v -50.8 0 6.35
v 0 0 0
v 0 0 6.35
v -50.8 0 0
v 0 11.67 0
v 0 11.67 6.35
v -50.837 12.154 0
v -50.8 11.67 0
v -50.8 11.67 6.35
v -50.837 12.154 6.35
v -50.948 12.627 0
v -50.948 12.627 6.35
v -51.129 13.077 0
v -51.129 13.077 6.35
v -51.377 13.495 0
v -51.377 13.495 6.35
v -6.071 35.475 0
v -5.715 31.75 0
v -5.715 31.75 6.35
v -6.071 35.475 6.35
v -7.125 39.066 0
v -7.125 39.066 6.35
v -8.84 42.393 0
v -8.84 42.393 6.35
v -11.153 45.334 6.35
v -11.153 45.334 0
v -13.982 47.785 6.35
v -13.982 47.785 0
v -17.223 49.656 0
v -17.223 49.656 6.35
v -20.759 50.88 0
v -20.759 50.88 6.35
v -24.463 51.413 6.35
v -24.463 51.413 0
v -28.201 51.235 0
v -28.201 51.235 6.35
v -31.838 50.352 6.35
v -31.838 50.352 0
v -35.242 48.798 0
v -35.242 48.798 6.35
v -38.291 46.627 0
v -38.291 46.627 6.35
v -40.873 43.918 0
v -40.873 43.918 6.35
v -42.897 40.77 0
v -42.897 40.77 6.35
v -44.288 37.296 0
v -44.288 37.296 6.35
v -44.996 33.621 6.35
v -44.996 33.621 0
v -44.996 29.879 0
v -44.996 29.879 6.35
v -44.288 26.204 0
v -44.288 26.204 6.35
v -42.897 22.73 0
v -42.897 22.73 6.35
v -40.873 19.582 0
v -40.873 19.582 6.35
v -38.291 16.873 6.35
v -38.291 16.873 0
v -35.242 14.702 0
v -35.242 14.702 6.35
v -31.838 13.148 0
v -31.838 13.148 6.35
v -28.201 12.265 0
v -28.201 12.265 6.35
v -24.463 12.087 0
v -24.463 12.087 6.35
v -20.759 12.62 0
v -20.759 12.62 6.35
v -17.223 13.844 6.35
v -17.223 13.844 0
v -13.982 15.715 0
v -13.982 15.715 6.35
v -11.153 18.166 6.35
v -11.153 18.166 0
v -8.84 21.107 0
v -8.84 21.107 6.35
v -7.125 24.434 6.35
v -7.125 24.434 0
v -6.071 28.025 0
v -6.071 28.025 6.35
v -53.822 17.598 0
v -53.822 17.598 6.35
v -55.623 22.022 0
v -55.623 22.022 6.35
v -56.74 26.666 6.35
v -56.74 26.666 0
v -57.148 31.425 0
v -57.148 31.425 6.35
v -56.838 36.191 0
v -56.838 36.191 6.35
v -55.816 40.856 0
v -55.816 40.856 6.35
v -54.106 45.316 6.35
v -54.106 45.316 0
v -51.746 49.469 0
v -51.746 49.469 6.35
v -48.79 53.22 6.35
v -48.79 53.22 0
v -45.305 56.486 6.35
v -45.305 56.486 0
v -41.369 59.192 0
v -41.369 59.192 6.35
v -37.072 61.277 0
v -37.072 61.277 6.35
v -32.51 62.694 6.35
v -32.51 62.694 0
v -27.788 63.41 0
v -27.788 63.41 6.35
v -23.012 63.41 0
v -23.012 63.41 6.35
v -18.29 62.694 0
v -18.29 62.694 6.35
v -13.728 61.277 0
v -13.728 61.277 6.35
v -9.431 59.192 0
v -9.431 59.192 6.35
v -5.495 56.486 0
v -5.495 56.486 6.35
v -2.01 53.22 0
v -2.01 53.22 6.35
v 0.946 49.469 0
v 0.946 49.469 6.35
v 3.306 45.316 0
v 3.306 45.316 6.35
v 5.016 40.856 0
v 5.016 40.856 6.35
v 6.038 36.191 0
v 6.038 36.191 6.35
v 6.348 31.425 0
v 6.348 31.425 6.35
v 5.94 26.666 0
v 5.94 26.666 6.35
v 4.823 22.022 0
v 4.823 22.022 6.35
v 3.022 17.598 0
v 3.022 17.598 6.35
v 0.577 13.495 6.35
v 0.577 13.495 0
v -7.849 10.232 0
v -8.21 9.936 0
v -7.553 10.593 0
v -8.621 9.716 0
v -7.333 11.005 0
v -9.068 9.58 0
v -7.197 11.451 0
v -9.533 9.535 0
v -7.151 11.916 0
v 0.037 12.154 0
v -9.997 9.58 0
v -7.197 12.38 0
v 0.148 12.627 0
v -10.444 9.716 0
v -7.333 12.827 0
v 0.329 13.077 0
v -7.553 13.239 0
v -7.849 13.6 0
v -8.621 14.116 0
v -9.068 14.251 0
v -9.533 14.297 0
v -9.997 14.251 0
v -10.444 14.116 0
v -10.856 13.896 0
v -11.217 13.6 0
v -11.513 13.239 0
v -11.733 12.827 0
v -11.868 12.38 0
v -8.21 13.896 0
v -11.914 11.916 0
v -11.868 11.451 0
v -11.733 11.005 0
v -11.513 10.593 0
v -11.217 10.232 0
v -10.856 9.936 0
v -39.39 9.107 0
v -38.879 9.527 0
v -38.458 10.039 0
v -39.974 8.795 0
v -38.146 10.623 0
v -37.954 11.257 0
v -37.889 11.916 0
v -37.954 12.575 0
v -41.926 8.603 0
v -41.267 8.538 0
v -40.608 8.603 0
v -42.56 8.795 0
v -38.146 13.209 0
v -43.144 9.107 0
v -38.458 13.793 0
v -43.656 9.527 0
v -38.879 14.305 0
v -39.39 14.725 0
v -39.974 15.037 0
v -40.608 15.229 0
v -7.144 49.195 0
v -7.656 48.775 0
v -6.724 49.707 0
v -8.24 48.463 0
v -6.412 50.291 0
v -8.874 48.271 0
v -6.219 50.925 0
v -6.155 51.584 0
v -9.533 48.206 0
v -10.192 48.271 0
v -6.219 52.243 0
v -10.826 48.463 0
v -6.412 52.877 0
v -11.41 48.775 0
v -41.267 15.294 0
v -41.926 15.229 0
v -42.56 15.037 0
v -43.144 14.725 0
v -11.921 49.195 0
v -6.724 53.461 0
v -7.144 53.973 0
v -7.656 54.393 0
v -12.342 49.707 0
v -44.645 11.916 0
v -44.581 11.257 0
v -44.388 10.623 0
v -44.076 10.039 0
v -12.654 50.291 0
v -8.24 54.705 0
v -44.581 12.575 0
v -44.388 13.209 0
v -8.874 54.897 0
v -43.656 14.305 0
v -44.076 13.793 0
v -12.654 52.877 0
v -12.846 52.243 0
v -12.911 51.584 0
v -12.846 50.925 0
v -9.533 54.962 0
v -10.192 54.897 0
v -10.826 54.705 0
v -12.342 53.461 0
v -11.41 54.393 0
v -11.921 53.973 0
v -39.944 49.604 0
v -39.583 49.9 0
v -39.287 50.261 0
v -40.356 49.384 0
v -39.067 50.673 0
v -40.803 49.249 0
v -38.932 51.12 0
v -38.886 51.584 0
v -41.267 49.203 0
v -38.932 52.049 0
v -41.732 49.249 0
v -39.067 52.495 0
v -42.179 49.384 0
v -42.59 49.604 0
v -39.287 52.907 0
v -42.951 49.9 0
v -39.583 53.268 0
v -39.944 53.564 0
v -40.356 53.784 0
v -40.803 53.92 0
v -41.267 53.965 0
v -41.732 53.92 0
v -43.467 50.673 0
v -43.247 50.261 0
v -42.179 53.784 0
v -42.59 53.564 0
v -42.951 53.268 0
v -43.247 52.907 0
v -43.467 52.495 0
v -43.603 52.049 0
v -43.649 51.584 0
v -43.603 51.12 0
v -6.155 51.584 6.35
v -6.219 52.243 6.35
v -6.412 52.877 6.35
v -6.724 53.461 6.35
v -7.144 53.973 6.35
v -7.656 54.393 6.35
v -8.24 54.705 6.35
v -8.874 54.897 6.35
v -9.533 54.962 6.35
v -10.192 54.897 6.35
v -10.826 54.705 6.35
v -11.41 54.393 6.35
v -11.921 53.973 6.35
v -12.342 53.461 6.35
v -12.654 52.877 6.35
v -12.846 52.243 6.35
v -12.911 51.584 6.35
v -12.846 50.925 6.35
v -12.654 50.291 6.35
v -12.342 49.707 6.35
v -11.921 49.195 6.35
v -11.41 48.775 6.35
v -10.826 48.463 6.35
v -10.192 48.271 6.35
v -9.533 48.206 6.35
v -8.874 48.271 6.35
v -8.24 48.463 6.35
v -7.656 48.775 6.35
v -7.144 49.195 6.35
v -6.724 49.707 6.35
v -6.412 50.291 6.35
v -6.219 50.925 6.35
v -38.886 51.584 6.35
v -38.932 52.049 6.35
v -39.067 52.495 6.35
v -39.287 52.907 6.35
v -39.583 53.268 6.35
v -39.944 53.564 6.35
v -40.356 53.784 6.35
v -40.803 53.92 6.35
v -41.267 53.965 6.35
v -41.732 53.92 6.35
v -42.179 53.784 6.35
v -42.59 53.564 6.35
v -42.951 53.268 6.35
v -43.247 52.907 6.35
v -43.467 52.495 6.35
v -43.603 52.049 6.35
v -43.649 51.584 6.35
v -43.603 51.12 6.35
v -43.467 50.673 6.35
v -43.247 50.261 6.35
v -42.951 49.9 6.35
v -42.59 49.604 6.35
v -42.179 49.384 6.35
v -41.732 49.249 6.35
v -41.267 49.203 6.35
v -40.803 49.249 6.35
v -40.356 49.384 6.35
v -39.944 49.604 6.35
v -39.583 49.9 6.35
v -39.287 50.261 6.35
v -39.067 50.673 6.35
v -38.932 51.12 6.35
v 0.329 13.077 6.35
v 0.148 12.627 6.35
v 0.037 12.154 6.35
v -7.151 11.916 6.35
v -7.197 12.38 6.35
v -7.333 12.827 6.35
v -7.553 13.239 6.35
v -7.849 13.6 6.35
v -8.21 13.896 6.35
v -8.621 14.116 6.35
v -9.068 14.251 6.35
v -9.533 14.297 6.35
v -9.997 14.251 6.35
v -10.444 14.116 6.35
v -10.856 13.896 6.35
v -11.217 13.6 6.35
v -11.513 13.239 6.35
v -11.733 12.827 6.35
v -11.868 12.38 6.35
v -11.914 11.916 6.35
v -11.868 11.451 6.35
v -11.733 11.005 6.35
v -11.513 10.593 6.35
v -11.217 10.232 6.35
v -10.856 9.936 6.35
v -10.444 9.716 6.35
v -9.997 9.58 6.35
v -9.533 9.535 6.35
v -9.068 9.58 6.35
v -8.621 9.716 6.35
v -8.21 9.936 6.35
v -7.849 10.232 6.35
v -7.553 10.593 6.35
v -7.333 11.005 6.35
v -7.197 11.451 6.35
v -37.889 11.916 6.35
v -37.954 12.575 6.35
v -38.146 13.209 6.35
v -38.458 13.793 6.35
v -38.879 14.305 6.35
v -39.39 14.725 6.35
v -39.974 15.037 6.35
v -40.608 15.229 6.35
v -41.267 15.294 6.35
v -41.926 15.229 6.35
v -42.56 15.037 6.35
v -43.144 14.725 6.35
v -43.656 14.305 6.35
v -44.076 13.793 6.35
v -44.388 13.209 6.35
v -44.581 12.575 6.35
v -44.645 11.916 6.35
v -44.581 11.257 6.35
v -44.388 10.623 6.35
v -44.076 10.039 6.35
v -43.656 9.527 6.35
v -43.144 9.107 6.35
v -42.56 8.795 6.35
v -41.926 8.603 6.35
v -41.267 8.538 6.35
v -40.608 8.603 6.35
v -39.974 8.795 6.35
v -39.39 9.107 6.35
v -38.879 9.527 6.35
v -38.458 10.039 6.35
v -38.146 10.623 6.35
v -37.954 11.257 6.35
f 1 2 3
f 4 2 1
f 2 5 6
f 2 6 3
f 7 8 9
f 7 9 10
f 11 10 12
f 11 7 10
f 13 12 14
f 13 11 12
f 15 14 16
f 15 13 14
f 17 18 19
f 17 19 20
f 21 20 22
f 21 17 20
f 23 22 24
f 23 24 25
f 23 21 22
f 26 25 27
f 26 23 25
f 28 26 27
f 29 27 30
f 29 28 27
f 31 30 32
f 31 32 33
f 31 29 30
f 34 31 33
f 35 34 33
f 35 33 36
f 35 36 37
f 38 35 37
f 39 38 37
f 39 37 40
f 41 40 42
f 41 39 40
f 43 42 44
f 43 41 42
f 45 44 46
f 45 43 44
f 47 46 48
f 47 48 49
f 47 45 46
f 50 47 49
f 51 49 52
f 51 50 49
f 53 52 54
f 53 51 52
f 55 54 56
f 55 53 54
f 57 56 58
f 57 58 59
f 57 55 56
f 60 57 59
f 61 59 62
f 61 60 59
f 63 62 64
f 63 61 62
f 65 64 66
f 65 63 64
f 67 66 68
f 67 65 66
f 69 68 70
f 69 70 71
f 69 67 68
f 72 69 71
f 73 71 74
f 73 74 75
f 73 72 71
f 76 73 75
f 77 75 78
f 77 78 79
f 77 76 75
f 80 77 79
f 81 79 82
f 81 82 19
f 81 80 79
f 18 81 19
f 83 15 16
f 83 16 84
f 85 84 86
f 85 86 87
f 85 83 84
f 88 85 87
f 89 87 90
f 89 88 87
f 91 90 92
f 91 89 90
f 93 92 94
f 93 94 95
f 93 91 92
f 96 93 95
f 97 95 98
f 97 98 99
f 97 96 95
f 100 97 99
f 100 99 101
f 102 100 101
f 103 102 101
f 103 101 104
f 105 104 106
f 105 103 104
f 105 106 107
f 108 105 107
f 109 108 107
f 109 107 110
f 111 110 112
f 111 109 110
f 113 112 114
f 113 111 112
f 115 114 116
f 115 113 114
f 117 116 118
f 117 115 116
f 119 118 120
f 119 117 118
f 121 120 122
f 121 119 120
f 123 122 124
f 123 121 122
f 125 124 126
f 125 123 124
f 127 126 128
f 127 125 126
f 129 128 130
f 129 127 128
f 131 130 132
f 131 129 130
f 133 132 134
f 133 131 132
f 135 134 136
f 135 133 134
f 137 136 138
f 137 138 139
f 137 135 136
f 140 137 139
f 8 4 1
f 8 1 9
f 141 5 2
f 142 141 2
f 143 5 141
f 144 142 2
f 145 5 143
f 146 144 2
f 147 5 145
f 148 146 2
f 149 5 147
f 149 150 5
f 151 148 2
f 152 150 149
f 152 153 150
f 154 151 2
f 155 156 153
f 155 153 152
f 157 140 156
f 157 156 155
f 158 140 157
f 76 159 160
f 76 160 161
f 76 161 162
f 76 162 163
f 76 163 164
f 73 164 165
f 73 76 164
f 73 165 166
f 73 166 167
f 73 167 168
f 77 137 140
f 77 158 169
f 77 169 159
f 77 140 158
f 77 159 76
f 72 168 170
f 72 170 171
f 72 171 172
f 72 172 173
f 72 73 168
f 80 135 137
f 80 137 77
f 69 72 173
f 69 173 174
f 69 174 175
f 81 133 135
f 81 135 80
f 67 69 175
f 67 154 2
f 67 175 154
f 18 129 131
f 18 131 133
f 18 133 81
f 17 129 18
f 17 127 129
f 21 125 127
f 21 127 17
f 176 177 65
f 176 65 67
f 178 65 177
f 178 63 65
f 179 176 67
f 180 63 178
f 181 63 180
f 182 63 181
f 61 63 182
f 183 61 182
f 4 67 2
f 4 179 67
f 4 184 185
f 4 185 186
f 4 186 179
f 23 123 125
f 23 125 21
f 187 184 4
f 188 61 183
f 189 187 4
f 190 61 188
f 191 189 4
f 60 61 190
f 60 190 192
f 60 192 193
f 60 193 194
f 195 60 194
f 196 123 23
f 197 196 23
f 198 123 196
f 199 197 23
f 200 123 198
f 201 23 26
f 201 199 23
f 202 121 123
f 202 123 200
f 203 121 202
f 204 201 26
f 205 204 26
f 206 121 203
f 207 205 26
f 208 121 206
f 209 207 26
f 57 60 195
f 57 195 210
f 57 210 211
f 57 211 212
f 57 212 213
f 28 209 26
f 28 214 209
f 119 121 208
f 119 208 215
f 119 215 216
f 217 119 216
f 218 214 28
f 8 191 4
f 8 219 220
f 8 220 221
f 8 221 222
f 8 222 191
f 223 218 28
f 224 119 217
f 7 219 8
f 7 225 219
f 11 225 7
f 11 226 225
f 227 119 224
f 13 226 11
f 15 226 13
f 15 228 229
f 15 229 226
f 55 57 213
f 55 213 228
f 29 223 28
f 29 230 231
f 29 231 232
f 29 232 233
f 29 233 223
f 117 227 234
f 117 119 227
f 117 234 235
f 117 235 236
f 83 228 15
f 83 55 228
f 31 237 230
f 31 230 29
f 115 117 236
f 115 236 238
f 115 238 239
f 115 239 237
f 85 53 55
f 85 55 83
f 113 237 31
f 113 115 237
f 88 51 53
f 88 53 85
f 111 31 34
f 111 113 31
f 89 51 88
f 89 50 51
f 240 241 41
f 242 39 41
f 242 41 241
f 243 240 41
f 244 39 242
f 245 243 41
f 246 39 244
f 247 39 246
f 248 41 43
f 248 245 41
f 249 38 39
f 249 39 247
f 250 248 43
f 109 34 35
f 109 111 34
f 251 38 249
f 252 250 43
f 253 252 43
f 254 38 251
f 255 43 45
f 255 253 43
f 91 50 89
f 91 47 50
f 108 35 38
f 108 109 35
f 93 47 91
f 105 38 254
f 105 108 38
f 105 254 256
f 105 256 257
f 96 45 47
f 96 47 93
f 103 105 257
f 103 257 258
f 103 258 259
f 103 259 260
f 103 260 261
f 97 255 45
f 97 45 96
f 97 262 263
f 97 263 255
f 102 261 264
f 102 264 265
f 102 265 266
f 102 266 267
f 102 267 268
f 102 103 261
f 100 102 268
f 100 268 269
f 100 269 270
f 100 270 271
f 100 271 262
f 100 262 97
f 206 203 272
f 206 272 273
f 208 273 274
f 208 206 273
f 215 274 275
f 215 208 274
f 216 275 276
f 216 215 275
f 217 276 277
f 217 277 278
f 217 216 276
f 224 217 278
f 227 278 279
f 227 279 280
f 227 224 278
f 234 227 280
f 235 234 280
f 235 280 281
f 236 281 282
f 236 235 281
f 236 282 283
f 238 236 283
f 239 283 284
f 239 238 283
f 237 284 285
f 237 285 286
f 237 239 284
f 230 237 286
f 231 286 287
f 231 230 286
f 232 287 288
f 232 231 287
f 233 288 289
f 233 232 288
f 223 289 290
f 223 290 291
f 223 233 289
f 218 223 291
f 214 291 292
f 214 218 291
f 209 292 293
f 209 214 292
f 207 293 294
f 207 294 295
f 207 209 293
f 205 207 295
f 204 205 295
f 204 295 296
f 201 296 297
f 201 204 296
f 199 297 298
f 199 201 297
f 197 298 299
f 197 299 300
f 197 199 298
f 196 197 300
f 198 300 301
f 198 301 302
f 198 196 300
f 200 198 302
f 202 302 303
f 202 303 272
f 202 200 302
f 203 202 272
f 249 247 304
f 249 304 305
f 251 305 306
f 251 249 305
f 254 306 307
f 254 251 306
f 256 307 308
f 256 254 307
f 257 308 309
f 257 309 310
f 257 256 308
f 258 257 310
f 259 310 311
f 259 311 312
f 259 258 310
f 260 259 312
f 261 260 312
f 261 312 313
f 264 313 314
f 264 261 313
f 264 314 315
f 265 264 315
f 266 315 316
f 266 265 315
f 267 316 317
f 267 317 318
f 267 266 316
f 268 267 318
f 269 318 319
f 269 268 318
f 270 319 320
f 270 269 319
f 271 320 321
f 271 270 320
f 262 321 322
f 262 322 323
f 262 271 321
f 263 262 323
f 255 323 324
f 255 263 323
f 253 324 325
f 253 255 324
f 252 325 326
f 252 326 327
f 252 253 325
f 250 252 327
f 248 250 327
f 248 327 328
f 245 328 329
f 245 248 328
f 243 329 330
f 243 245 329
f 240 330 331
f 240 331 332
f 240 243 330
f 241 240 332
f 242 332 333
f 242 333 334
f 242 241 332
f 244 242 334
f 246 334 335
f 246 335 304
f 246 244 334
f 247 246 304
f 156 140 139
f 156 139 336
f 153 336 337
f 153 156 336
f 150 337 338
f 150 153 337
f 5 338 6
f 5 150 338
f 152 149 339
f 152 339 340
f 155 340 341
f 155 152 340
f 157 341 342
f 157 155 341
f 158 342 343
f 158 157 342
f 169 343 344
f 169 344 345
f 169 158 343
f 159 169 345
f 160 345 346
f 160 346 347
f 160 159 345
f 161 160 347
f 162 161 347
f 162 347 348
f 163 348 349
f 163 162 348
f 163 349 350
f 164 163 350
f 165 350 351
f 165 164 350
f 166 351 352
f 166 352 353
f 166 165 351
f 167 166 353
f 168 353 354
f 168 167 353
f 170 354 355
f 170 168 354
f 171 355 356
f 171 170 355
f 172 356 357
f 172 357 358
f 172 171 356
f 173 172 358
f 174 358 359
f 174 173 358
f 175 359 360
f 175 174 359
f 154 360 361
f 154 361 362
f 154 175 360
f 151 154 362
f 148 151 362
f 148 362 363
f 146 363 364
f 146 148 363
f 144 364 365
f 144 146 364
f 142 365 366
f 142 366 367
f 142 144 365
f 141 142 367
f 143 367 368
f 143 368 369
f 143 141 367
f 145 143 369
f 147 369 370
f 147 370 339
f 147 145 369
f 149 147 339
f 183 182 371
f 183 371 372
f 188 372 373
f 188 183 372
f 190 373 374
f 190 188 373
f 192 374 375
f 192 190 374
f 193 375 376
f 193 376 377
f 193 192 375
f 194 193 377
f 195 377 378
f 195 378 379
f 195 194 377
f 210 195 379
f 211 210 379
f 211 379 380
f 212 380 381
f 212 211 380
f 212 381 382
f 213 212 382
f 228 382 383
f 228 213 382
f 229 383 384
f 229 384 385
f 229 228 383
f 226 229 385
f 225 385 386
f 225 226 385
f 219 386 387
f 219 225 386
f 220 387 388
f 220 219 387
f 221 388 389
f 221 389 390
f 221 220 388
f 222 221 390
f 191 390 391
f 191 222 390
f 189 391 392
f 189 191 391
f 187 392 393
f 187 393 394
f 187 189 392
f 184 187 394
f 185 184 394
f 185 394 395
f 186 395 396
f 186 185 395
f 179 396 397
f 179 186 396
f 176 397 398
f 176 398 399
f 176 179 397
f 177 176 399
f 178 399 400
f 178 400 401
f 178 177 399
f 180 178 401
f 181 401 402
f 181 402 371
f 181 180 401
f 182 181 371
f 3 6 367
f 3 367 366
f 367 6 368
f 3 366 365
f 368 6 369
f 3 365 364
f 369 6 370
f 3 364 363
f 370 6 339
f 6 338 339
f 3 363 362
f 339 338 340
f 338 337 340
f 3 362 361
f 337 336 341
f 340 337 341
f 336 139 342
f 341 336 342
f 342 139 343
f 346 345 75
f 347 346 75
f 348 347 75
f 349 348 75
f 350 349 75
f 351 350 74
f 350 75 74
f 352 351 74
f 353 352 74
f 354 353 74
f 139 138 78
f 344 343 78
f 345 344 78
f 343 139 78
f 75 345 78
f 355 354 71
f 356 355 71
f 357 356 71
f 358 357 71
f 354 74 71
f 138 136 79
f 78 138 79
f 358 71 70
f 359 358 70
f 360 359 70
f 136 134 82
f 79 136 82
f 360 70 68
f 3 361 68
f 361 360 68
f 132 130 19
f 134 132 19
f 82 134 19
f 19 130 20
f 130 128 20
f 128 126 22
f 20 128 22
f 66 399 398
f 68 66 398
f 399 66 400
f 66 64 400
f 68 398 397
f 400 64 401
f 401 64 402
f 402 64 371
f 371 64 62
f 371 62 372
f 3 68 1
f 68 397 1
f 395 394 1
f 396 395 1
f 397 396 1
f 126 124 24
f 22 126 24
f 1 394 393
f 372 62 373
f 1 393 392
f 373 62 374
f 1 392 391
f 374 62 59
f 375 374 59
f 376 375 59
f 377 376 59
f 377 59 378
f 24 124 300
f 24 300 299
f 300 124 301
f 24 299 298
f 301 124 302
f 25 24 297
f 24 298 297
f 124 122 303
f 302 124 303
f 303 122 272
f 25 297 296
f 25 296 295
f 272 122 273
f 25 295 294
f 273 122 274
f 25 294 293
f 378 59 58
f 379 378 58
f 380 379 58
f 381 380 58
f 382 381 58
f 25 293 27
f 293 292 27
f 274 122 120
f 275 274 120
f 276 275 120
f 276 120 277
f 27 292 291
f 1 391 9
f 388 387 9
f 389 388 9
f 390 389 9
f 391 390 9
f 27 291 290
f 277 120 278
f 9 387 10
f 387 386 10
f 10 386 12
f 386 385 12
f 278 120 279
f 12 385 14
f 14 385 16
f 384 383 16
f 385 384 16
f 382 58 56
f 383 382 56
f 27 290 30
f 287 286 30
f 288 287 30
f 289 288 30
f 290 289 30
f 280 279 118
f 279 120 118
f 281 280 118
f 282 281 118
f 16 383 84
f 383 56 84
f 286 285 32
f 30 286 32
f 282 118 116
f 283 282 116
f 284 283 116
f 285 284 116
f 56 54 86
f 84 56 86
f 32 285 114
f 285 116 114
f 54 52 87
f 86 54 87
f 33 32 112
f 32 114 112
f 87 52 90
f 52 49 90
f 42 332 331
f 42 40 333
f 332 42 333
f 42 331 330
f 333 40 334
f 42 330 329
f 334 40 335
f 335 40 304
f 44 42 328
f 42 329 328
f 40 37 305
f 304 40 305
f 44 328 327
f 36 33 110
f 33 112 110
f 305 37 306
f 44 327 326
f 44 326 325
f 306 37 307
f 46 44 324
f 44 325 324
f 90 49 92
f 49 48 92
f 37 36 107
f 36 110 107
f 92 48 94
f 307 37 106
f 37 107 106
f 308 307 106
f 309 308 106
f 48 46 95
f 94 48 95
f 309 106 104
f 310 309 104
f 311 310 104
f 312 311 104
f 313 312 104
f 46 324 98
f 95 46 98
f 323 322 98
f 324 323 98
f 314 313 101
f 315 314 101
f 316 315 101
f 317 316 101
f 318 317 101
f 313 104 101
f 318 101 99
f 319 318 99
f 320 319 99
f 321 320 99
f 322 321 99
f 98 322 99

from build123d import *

# Parameters (mm, degrees)
SKETCH1_R           = 19.685
SKETCH1_R_2         = 2.38125
SKETCH1_R_3         = 3.3782
BOSS_EXTRUDE1_DEPTH = 6.35


with BuildPart() as part:
    # Sketch1 → Boss-Extrude1 (new body)
    with BuildSketch(Plane.XY):
        with BuildLine():
            Line((0, 0), (-50.8, 0))
            Line((-50.8, 0), (-50.8, 11.669536858))
            ThreePointArc((-50.8, 11.669536858), (-50.947756279, 12.626835377), (-51.377272727, 13.495033507))
            ThreePointArc((-51.377272727, 13.495033507), (-25.4, 63.5), (0.577272727, 13.495033507))
            ThreePointArc((0.577272727, 13.495033507), (0.147756279, 12.626835377), (0, 11.669536858))
            Line((0, 11.669536858), (0, 0))
        make_face()
        with Locations((-25.4, 31.75)):
            Circle(SKETCH1_R, mode=Mode.SUBTRACT)
        with Locations((-41.267254208, 51.58406776)):
            Circle(SKETCH1_R_2, mode=Mode.SUBTRACT)
        with Locations((-9.532745792, 51.58406776)):
            Circle(SKETCH1_R_3, mode=Mode.SUBTRACT)
        with Locations((-9.532745792, 11.91593224)):
            Circle(SKETCH1_R_2, mode=Mode.SUBTRACT)
        with Locations((-41.267254208, 11.91593224)):
            Circle(SKETCH1_R_3, mode=Mode.SUBTRACT)
    extrude(amount=BOSS_EXTRUDE1_DEPTH)


solid = part.part
